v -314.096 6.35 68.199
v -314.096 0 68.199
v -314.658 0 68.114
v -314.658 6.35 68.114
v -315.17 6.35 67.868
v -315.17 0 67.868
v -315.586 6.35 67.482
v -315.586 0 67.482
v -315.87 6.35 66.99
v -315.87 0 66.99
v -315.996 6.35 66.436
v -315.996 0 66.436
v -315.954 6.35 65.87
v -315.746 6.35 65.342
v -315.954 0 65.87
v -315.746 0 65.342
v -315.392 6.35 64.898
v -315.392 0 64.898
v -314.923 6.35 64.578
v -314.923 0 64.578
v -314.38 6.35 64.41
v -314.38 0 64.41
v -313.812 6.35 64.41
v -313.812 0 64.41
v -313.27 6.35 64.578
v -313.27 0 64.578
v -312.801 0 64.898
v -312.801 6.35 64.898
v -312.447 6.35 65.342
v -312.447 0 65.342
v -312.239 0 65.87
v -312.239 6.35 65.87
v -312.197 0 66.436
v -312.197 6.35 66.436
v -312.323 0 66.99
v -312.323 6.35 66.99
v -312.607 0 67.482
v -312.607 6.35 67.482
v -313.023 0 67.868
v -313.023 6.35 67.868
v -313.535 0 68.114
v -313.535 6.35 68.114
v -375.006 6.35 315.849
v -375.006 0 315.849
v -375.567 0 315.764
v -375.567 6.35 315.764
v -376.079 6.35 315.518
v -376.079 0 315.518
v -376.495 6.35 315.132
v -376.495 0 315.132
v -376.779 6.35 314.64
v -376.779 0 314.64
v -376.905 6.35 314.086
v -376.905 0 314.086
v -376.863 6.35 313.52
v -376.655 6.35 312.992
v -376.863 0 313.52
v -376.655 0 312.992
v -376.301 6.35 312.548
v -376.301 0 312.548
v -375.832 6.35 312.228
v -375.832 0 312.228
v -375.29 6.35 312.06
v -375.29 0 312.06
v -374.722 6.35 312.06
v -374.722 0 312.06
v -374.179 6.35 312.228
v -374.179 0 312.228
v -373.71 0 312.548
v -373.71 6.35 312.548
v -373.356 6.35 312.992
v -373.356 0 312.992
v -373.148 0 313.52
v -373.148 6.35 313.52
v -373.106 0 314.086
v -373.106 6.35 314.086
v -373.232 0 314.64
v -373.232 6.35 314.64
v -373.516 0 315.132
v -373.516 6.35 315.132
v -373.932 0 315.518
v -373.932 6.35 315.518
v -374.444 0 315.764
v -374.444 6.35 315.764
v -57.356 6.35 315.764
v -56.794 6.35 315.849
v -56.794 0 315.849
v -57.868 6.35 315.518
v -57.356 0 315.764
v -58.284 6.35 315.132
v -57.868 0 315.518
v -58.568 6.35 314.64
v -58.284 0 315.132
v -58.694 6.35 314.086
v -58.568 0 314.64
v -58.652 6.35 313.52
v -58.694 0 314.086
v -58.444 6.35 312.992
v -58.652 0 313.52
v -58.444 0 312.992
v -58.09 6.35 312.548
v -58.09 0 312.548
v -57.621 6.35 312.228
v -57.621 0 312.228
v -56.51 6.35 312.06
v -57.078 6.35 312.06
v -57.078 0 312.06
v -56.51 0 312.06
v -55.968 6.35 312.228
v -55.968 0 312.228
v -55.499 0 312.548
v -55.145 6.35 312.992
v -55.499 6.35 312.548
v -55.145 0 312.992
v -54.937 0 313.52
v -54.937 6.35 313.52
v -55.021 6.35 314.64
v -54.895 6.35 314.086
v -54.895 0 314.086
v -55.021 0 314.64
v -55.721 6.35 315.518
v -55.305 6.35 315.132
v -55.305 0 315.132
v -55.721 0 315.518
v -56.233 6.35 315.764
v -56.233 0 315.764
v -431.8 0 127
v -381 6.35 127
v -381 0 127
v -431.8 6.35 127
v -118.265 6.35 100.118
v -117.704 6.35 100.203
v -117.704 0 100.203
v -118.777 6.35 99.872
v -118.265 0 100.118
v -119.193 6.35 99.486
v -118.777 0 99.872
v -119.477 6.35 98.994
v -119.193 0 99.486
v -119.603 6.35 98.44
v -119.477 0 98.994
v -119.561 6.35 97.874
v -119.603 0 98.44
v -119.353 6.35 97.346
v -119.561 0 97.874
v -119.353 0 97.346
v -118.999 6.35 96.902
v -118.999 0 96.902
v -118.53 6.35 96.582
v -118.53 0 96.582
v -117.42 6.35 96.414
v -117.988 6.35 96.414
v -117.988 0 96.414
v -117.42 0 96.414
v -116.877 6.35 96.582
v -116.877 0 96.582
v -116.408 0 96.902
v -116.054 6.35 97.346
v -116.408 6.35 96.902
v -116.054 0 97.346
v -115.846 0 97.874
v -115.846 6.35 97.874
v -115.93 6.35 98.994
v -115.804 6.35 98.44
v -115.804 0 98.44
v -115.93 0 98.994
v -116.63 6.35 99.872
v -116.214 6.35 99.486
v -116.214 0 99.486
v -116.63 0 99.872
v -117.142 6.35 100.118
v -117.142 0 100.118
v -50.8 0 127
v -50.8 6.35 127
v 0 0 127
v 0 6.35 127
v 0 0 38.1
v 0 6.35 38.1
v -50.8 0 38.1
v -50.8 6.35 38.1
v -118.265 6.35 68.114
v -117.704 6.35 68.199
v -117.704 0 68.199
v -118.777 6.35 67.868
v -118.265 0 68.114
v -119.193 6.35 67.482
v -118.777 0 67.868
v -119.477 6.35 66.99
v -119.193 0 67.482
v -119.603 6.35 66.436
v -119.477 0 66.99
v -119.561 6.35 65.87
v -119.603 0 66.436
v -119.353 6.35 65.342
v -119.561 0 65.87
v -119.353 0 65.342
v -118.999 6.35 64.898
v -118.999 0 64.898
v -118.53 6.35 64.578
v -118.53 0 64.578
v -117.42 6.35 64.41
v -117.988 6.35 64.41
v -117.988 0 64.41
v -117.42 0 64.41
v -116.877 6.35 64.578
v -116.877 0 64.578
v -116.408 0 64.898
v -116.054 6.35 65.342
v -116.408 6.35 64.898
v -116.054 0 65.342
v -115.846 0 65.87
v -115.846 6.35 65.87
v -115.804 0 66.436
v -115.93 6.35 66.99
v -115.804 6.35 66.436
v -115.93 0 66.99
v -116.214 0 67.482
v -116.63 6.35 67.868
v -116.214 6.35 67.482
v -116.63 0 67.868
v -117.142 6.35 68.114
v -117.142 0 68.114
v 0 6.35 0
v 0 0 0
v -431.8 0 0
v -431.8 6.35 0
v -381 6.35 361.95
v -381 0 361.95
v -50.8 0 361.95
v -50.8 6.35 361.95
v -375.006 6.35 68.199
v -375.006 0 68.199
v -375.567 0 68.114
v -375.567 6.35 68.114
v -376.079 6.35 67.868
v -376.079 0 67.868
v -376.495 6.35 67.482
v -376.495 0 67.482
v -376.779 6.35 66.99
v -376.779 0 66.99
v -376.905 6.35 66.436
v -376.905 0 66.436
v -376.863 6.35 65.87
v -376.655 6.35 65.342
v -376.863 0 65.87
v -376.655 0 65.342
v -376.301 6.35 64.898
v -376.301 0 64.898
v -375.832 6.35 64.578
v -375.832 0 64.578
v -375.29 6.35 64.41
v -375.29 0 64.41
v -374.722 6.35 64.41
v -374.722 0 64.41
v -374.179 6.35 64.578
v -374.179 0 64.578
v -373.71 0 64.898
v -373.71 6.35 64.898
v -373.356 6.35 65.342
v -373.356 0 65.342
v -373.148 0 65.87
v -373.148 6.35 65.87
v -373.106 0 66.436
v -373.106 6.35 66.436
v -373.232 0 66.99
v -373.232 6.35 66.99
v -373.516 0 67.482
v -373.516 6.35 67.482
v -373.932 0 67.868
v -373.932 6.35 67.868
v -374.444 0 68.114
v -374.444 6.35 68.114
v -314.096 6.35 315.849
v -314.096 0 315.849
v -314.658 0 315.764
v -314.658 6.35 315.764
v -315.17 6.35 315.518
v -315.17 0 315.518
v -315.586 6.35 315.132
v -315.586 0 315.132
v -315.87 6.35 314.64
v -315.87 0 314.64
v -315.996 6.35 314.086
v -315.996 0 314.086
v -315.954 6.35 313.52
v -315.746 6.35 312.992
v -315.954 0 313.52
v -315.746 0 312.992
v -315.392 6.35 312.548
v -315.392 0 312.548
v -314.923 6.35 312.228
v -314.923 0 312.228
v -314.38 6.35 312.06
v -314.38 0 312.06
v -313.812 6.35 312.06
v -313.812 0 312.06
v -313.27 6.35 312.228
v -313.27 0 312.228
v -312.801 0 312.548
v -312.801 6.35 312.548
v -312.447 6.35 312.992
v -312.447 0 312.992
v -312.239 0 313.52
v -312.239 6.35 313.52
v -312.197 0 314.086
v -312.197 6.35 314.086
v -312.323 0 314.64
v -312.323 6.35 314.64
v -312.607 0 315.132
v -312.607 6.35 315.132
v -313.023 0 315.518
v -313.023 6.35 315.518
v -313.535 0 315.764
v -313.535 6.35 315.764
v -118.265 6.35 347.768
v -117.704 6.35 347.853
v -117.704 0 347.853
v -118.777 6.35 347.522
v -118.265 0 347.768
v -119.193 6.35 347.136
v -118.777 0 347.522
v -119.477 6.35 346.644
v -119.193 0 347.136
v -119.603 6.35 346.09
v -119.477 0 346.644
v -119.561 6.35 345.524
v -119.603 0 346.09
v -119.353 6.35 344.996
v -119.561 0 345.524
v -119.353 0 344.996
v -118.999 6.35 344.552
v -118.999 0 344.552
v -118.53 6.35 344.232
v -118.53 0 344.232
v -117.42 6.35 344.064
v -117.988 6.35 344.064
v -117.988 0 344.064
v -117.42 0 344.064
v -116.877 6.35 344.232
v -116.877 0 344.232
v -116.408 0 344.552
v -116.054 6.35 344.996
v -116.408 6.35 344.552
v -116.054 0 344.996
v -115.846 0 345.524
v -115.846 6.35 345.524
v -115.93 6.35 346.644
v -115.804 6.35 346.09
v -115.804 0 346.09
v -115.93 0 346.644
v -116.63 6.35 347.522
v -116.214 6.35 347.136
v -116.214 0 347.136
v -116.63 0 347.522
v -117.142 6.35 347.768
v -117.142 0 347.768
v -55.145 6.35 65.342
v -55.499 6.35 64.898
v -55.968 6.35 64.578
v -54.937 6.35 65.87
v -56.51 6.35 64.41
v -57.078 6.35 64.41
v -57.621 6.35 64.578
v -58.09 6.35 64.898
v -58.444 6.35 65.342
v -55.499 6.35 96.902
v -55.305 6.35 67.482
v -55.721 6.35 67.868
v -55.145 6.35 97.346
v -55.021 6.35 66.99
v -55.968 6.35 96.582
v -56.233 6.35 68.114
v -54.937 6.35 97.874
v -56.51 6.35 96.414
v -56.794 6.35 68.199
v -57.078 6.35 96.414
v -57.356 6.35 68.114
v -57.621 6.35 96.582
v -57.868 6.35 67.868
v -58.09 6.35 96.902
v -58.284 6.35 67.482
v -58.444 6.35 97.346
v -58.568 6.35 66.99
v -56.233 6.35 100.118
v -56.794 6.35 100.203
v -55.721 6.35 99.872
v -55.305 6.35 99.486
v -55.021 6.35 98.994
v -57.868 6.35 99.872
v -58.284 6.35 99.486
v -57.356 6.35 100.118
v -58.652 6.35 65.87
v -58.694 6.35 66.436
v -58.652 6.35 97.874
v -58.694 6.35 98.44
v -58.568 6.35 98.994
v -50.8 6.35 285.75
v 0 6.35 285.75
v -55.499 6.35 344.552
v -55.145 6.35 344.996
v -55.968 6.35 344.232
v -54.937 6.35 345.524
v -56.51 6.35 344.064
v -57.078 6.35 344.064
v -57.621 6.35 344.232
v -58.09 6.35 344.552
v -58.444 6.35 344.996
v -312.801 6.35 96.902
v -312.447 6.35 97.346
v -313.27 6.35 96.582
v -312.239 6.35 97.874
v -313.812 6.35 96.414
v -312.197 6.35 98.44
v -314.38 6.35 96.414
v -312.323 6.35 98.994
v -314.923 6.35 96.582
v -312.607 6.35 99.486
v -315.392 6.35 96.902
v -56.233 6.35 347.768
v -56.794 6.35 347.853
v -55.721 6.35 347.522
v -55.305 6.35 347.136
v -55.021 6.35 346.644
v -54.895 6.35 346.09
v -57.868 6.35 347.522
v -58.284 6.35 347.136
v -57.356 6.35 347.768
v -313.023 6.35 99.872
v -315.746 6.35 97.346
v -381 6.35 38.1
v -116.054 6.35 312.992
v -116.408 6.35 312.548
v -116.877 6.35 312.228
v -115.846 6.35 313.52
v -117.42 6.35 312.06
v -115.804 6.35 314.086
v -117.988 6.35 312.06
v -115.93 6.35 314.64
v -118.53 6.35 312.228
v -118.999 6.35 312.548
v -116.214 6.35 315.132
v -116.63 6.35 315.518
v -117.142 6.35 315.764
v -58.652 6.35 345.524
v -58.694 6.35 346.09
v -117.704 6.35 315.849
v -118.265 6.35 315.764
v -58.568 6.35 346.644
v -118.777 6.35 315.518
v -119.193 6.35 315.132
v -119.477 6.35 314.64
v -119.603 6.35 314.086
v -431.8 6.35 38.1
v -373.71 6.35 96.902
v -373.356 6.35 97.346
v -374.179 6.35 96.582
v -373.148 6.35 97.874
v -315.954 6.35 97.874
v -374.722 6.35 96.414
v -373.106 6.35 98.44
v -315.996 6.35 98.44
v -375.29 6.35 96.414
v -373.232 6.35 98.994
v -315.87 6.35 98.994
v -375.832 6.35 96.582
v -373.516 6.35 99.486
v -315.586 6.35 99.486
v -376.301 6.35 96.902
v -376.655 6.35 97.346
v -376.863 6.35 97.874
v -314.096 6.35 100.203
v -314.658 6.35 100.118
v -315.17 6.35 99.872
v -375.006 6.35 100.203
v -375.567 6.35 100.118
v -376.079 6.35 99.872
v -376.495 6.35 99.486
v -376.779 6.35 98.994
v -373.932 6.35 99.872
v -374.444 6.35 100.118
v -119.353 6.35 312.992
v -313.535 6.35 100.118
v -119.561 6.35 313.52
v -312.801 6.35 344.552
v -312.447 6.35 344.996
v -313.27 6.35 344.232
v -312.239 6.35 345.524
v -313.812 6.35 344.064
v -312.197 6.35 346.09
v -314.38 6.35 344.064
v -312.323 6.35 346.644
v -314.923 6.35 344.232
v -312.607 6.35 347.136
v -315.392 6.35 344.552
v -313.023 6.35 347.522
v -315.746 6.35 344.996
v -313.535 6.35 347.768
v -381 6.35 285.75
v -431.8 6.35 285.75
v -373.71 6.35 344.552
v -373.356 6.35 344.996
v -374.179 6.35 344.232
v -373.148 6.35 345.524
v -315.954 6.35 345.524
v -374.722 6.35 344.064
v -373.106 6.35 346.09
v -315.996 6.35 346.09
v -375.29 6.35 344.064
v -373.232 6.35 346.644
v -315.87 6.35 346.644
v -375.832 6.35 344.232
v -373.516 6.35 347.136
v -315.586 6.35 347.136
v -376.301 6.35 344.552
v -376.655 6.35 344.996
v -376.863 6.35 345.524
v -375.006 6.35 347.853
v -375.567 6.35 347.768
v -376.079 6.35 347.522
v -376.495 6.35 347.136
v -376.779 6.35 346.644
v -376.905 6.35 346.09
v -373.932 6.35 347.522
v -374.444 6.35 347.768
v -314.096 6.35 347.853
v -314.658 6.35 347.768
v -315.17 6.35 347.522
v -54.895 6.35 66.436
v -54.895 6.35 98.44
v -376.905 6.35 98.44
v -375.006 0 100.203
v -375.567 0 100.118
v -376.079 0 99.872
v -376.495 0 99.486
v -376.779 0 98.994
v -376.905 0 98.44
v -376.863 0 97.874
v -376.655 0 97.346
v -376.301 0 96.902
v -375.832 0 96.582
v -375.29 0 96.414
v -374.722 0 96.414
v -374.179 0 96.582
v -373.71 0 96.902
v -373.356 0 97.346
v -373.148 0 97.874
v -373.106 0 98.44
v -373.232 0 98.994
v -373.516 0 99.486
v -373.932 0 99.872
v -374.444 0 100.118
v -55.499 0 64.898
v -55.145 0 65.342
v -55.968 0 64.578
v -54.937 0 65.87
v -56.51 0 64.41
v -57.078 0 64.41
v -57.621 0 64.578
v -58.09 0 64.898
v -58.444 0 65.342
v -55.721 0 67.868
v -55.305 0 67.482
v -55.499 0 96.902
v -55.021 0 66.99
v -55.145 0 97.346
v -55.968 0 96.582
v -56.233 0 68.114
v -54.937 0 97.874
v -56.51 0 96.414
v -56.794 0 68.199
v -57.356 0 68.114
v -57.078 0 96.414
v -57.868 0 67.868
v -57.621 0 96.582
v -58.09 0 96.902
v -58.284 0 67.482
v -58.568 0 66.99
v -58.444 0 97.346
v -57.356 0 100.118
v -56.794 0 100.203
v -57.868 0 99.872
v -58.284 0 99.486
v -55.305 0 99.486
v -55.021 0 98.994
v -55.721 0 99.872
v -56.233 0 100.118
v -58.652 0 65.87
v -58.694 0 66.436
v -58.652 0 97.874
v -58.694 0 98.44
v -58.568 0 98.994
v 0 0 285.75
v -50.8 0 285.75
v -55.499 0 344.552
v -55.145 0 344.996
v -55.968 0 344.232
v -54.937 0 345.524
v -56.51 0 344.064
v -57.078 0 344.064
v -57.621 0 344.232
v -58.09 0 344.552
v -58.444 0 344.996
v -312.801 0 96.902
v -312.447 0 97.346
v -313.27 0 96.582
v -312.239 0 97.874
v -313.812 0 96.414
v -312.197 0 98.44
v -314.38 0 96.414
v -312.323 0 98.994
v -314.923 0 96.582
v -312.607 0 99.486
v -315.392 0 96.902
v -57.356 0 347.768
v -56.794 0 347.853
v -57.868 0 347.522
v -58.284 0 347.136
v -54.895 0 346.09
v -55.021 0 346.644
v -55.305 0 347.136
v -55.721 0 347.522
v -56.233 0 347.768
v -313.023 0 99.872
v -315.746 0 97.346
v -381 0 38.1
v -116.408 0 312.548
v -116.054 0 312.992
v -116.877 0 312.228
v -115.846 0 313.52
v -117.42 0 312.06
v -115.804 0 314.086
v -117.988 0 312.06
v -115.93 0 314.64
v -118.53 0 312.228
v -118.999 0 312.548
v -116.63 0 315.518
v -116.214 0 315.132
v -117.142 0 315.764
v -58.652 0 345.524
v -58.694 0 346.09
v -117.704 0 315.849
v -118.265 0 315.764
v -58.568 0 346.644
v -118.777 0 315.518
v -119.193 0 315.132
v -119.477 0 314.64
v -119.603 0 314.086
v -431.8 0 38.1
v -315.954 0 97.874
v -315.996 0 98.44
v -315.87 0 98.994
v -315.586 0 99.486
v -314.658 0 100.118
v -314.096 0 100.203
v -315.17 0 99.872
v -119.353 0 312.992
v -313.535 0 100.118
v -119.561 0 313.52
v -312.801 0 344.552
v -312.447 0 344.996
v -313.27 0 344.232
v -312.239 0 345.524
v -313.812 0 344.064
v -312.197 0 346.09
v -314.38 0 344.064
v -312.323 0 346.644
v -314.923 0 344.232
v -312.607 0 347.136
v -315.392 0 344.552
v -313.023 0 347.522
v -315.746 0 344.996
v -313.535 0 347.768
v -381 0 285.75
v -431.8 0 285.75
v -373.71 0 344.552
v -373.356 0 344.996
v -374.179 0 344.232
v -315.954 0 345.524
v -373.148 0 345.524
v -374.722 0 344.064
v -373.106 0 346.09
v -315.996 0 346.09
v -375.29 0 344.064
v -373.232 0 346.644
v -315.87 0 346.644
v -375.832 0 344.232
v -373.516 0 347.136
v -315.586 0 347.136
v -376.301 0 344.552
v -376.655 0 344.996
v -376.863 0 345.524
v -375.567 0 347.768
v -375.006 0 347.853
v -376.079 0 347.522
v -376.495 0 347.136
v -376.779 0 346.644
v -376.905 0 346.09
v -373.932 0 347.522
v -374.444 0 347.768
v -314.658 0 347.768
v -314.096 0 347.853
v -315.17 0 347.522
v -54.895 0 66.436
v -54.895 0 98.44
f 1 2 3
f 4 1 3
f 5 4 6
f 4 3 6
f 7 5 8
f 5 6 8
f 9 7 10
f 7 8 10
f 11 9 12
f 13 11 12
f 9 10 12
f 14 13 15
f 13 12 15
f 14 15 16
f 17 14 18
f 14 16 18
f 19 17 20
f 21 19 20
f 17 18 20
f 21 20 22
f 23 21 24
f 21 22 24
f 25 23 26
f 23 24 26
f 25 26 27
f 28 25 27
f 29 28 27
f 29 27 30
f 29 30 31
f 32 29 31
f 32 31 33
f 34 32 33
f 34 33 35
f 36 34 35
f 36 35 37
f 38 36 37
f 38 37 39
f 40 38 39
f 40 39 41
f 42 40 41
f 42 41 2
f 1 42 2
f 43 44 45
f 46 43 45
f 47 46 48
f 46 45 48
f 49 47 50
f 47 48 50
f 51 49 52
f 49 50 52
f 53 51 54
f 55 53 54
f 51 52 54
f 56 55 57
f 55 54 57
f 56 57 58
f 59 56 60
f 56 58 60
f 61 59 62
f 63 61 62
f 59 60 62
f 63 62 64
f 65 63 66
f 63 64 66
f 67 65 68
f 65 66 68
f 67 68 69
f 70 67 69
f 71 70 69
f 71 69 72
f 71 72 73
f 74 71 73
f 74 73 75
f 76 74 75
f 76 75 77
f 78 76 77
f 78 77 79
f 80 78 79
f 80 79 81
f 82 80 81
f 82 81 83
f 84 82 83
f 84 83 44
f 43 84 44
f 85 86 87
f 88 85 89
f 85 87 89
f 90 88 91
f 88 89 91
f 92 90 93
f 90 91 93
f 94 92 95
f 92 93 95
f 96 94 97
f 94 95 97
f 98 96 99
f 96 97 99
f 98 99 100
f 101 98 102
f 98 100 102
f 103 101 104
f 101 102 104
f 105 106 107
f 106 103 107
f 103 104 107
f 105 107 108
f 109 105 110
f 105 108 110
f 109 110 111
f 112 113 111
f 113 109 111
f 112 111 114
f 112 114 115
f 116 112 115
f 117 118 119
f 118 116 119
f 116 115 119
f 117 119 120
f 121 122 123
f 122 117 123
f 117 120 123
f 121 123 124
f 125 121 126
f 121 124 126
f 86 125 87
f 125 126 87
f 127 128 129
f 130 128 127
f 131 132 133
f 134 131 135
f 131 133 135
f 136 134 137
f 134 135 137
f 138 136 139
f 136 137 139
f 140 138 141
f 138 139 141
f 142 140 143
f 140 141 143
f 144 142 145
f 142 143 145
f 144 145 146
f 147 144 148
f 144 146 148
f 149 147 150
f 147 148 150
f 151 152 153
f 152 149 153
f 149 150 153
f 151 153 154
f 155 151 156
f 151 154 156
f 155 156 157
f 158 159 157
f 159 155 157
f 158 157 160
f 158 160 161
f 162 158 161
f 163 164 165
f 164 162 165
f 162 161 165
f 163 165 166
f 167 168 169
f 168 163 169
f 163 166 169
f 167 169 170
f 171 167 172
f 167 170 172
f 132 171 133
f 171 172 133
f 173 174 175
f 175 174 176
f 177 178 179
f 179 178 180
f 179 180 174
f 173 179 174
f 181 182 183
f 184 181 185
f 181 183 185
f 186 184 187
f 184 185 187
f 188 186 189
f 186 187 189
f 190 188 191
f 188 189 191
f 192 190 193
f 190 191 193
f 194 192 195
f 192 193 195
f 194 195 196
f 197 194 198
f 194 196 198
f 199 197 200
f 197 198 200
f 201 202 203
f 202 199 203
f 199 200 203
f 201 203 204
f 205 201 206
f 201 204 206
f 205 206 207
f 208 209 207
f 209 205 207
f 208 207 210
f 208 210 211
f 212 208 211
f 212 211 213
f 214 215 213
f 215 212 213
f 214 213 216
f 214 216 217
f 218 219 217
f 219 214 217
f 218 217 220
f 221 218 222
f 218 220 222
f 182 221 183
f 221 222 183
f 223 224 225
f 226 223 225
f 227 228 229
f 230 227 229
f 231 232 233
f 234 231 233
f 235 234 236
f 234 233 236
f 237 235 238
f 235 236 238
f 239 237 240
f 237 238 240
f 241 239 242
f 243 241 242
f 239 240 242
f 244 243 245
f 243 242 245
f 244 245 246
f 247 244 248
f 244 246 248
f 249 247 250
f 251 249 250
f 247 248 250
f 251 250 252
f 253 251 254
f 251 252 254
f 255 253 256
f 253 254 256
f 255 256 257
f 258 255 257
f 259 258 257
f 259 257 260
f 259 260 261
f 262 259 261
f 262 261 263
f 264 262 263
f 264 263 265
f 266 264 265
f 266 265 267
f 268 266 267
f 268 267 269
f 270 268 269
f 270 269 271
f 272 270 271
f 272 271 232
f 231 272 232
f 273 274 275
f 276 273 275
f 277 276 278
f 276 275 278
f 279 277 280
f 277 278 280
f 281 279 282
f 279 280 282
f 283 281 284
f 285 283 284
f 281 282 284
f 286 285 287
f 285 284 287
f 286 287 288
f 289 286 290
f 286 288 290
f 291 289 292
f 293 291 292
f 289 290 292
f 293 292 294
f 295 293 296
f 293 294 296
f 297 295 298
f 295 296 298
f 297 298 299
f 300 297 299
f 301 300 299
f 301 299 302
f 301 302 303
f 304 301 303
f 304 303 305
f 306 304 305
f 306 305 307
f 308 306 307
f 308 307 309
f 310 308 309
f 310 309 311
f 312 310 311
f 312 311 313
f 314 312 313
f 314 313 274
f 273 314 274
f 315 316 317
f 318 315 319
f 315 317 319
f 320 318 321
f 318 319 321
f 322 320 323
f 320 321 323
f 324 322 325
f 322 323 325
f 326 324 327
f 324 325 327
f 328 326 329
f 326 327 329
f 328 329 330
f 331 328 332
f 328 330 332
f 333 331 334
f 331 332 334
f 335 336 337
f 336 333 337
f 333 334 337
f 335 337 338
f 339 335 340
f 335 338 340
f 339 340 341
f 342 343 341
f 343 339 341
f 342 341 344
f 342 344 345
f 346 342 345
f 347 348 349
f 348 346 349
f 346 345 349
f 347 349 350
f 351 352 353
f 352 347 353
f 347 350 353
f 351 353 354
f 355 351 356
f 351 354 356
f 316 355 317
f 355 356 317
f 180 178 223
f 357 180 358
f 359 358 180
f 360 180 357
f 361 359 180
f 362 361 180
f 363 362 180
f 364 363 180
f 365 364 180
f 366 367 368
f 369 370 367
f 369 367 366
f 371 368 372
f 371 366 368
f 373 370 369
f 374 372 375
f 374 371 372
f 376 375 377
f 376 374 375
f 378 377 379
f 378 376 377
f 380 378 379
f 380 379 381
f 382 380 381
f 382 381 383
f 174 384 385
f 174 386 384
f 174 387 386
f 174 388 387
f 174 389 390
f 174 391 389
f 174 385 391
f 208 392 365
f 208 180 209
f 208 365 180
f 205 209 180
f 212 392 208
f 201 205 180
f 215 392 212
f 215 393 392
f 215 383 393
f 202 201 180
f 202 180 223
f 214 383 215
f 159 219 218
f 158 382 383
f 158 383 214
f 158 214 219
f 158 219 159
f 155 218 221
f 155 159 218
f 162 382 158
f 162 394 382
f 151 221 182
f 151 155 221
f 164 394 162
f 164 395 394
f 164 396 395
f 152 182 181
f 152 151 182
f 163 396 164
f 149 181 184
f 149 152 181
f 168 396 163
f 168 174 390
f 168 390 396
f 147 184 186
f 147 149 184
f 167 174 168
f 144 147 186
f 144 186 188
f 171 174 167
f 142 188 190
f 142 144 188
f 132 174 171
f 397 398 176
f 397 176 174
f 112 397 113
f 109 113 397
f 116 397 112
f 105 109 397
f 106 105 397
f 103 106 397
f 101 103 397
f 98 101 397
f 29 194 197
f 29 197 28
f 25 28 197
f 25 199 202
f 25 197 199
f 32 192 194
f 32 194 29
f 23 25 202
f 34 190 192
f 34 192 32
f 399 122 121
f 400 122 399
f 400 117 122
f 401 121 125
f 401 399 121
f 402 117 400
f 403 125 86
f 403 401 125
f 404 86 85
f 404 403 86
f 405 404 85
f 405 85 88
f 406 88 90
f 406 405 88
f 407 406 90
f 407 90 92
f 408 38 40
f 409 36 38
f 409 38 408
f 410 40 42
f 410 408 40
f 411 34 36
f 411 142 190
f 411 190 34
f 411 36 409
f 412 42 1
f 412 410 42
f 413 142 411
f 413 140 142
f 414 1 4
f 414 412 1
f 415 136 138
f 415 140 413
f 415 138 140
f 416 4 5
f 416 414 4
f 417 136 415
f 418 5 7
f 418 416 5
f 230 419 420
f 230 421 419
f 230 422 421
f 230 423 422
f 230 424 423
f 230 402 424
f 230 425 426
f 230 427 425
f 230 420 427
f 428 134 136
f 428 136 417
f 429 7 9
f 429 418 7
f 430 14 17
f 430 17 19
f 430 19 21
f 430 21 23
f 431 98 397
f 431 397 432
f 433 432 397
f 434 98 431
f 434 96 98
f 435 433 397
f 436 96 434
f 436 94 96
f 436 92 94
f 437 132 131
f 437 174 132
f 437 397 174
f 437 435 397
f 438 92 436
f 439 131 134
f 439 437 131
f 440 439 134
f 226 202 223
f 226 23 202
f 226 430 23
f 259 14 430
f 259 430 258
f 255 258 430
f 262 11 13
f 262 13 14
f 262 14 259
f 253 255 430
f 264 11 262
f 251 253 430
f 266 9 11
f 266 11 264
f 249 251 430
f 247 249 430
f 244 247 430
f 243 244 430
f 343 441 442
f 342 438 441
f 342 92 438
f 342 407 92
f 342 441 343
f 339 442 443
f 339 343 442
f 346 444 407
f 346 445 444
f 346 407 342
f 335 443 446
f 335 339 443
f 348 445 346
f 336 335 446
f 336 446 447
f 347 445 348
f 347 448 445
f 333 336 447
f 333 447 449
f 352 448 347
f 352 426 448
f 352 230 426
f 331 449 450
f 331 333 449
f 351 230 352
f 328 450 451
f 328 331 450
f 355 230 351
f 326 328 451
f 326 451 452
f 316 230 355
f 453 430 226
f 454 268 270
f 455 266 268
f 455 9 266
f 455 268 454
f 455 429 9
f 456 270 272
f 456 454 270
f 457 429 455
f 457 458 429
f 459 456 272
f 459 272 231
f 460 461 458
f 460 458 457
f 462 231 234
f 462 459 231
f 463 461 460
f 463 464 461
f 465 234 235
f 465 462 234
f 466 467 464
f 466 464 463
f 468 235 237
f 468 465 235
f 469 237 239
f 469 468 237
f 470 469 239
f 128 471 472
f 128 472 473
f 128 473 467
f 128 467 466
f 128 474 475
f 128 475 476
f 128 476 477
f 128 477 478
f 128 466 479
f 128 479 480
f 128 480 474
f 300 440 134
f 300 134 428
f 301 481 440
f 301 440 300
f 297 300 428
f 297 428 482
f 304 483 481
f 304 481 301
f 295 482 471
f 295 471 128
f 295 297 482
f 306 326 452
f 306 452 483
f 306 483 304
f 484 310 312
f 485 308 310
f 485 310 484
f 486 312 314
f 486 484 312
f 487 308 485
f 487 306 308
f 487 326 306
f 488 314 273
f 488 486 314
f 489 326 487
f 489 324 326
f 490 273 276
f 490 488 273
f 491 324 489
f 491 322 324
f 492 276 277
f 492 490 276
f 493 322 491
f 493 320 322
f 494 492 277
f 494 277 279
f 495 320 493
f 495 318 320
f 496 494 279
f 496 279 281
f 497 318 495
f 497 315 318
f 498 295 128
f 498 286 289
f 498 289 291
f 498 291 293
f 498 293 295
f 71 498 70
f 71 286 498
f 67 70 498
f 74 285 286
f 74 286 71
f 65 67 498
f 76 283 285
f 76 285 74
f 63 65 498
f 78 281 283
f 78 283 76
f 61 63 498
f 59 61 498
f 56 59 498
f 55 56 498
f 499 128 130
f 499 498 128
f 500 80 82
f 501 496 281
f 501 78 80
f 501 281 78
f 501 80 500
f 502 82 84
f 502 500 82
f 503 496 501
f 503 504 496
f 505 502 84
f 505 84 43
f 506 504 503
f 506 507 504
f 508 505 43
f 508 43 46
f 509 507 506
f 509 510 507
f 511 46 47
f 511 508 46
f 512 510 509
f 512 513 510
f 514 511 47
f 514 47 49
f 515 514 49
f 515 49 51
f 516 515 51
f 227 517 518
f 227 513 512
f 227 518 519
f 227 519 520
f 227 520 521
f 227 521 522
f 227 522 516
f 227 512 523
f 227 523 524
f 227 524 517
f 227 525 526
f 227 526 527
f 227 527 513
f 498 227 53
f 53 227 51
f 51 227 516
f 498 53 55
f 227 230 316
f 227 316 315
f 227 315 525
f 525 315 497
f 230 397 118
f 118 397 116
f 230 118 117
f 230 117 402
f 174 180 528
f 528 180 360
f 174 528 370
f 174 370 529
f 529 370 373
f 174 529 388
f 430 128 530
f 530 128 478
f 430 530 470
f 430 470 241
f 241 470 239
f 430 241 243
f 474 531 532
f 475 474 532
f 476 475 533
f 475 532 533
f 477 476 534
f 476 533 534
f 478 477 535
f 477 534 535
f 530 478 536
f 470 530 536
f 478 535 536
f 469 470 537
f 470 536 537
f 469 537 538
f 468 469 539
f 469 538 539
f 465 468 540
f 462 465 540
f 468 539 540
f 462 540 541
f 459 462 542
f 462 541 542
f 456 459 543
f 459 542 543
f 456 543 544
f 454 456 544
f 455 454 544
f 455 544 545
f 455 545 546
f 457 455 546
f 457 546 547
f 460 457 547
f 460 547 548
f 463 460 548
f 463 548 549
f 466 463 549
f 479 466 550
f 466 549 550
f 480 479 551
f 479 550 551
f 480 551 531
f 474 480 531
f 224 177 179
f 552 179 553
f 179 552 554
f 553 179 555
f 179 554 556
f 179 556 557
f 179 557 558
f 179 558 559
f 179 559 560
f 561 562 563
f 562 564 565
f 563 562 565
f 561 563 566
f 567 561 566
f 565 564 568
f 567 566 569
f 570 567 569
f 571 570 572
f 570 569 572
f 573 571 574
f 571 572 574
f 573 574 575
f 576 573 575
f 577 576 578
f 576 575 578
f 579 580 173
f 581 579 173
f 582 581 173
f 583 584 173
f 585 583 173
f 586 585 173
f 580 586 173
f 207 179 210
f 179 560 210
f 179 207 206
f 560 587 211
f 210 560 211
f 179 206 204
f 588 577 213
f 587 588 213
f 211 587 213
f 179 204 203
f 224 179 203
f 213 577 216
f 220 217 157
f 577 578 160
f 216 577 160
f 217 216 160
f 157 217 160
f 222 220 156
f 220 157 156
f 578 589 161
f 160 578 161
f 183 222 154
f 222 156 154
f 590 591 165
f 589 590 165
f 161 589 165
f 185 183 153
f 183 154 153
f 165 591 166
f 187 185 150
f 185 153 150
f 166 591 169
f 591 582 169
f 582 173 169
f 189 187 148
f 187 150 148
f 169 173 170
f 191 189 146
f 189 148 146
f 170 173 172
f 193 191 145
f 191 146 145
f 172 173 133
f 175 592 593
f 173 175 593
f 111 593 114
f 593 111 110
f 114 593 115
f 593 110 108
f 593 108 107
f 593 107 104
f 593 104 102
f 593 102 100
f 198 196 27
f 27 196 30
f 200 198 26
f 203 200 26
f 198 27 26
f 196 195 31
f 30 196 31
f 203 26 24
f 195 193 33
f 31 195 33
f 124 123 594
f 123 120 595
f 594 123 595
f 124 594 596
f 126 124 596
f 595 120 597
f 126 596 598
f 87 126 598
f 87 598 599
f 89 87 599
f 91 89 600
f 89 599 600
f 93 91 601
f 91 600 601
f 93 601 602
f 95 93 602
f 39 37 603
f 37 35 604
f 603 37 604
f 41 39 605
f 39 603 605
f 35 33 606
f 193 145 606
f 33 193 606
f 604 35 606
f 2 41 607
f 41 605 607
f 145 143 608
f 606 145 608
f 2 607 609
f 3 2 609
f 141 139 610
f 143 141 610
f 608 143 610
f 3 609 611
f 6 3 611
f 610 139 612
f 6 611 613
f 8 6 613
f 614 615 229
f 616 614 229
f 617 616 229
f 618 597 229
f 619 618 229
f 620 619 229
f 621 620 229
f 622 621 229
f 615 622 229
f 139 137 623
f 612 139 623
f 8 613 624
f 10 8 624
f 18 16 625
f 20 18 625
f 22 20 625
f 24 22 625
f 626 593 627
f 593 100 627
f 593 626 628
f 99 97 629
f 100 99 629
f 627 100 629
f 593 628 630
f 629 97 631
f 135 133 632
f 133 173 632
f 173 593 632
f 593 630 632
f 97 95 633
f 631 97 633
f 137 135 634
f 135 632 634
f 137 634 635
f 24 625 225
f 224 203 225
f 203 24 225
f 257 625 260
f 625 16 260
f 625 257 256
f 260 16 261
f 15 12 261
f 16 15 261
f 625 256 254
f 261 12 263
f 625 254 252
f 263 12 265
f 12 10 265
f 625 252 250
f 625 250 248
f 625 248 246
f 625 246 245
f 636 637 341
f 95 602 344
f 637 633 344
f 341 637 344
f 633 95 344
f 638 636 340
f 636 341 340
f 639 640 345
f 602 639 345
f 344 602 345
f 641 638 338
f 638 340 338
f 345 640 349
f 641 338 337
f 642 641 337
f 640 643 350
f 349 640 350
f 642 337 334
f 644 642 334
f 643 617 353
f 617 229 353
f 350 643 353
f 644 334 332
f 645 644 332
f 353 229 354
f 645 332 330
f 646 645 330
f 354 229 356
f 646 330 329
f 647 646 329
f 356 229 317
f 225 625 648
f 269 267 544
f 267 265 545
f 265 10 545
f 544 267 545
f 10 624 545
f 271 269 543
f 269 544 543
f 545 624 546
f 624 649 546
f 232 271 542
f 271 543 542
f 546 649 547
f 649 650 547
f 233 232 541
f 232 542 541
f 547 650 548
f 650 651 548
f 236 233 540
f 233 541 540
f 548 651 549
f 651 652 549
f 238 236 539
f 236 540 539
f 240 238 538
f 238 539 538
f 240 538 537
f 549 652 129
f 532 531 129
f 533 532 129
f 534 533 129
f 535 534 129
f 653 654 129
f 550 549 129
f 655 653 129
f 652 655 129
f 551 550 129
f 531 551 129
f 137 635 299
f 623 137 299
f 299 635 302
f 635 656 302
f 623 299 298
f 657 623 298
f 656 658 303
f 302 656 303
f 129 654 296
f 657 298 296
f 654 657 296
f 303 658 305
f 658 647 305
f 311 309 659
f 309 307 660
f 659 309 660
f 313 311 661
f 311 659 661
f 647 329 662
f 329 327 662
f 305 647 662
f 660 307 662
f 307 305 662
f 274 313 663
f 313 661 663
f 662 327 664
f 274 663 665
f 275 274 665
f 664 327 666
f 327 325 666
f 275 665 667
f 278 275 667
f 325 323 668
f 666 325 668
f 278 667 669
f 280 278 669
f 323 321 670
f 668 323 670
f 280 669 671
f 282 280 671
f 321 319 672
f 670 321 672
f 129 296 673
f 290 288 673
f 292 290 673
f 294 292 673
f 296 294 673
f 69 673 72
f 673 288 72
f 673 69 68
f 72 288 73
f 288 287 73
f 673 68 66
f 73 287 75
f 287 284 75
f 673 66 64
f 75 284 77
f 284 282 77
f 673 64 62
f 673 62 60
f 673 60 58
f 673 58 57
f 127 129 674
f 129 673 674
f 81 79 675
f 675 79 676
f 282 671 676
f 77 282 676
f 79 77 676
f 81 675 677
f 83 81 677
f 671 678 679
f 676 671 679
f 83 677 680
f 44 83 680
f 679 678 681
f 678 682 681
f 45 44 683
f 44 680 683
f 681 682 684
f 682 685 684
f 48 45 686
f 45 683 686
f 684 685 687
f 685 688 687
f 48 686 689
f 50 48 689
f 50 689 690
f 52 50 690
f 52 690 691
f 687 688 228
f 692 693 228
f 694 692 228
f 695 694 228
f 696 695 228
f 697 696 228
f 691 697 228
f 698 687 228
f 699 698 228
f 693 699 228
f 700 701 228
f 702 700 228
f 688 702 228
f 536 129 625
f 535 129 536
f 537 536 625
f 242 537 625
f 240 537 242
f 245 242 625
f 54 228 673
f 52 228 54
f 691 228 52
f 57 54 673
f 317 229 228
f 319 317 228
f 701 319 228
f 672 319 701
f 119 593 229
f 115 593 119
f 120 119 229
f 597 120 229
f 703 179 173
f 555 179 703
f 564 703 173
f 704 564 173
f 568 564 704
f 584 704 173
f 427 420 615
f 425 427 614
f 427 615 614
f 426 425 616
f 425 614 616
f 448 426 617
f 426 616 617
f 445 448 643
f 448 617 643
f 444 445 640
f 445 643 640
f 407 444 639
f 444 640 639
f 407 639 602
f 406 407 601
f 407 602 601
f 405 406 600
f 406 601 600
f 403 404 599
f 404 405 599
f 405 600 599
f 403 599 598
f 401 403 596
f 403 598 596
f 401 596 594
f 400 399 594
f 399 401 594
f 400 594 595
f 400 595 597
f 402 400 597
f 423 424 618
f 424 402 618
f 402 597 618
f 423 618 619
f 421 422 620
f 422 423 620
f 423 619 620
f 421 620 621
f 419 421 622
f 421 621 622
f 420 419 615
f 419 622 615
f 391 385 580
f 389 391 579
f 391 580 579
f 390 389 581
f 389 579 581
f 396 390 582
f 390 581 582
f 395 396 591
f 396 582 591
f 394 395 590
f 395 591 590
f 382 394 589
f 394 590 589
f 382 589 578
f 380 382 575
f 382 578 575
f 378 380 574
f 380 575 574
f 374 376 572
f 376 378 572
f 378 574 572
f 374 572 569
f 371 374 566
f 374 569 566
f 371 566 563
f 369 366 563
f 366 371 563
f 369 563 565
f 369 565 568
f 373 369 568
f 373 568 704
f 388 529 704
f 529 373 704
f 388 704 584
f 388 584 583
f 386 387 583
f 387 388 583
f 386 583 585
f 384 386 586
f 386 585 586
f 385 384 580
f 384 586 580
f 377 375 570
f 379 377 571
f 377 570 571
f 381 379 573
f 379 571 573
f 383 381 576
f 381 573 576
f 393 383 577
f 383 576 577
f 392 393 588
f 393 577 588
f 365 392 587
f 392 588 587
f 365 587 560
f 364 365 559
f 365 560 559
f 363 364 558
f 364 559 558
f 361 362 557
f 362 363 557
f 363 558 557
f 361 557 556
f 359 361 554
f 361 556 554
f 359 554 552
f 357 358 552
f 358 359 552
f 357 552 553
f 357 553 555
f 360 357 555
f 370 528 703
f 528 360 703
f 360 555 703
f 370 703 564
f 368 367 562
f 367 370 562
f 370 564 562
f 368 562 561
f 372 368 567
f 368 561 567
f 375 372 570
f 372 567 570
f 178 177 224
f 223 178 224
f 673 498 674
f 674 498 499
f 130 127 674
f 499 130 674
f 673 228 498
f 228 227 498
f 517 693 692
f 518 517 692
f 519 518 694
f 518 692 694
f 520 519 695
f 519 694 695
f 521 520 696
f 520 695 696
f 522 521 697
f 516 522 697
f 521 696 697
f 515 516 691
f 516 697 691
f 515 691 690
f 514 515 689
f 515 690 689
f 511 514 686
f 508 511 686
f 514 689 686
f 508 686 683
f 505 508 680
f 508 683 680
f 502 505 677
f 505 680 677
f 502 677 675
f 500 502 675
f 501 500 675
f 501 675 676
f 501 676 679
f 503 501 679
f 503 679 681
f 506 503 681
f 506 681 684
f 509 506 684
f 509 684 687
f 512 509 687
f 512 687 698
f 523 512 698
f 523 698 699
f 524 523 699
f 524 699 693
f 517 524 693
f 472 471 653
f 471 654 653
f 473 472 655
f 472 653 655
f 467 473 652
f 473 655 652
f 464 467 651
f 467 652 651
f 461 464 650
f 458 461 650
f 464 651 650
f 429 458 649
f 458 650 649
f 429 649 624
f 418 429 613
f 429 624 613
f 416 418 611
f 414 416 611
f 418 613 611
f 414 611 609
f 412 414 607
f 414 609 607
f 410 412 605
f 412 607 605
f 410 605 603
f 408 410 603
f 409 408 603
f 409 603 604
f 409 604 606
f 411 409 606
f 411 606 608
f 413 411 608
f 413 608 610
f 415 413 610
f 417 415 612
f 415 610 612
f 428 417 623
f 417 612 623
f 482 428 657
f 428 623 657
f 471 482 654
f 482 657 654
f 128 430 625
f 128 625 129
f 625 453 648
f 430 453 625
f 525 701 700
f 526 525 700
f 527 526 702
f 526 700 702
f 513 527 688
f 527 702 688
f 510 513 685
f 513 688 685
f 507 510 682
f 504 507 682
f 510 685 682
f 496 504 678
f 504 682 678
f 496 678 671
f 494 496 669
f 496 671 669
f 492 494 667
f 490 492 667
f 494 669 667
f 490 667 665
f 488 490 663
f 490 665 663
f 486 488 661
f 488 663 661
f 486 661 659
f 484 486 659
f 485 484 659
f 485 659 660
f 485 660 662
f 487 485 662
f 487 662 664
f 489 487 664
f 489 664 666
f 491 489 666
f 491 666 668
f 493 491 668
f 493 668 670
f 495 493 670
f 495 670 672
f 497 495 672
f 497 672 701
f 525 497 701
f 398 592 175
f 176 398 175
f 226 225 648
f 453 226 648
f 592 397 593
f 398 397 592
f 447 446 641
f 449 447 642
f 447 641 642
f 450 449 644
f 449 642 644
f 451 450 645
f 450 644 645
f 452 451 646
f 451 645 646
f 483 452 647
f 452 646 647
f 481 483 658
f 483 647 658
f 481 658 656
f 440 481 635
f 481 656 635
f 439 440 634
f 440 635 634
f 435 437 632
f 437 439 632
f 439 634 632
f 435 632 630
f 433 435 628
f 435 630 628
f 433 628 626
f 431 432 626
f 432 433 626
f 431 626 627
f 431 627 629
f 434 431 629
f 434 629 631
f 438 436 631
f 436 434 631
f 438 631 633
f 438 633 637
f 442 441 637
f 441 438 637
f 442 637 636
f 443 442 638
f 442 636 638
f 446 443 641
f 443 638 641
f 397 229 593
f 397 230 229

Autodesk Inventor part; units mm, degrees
ref_plane "YZ Plane" through (0, 0, 0) normal (1, 0, 0) x (0, 1, 0)
ref_plane "XZ Plane" through (0, 0, 0) normal (0, 1, 0) x (-1, 0, 0)
sketch "Sketch1" plane through (0, 0, 0) normal (0, 1, 0) x (-1, 0, 0)
  line L0 (0, 0) -> (431.8, 0)
  line L1 (431.8, 0) -> (431.8, 361.95)
  line L2 (431.8, 361.95) -> (0, 361.95)
  line L3 (0, 361.95) -> (0, 0)
  dimension "d0" = 431.8
  dimension "d1" = 361.95
extrude "Extrusion1" add sketch "Sketch1" along normal blind 6.35
sketch "Sketch3" plane through (0, 6.35, 0) normal (0, 1, 0) x (1, 0, 0)
  line L0 (-431.8, 0) -> (-431.8, -361.95) projected
  line L1 (-431.8, -361.95) -> (-381, -361.95)
  line L2 (-381, -361.95) -> (-381, -285.75)
  line L3 (-381, -285.75) -> (-431.8, -285.75)
  line L4 (-431.8, -285.75) -> (-431.8, -361.95)
  line L5 (-431.8, -38.1) -> (-381, -38.1)
  line L6 (-381, -38.1) -> (-381, -127)
  line L7 (-381, -127) -> (-431.8, -127)
  line L8 (-431.8, -127) -> (-431.8, -38.1)
  line L9 (0, -361.95) -> (0, 0) projected
  line L10 (0, -38.1) -> (-50.8, -38.1)
  line L11 (-50.8, -38.1) -> (-50.8, -127)
  line L12 (-50.8, -127) -> (0, -127)
  line L13 (0, -127) -> (0, -38.1)
  line L14 (0, -361.95) -> (-50.8, -361.95)
  line L15 (-50.8, -361.95) -> (-50.8, -285.75)
  line L16 (-50.8, -285.75) -> (0, -285.75)
  line L17 (0, -285.75) -> (0, -361.95)
  line L18 (0, 0) -> (-431.8, 0) projected
  dimension "d11" = 76.2
  dimension "d12" = 88.9
  dimension "d13" = 127
  dimension "d14" = 50.8
  dimension "d15" = 50.8
extrude "Extrusion3" cut sketch "Sketch3" against normal blind 6.35
sketch "Sketch4" plane through (0, 6.35, 0) normal (0, 1, 0) x (1, 0, 0)
  line L0 (0, 0) -> (-431.8, 0) projected
  line L1 (-381, -38.1) -> (-381, -127) projected
  line L2 (-381, -285.75) -> (-381, -361.95) projected
  line L3 (-381, -361.95) -> (-50.8, -361.95) projected
  point P0 (-375.0056, -66.294)
  point P1 (-375.0056, -98.298)
  point P2 (-314.0964, -66.294)
  point P3 (-314.0964, -98.298)
  point P4 (-375.0056, -345.948)
  point P5 (-375.0056, -313.944)
  point P6 (-314.0964, -345.948)
  point P7 (-314.0964, -313.944)
  dimension "d18" = 66.294
  dimension "d19" = 5.9944
  dimension "d20" = 98.298
  dimension "d21" = 5.9944
  dimension "d22" = 66.9036
  dimension "d23" = 66.294
  dimension "d24" = 98.298
  dimension "d25" = 66.9036
  dimension "d26" = 5.9944
  dimension "d27" = 16.002
  dimension "d28" = 5.9944
  dimension "d29" = 48.006
  dimension "d30" = 66.9036
  dimension "d31" = 66.9036
  dimension "d32" = 16.002
  dimension "d33" = 48.006
hole "Hole1" at (-375.0056, 6.35, 66.294) at (-375.0056, 6.35, 98.298) at (-314.0964, 6.35, 66.294) at (-314.0964, 6.35, 98.298) at (-375.0056, 6.35, 345.948) at (-375.0056, 6.35, 313.944) at (-314.0964, 6.35, 345.948) at (-314.0964, 6.35, 313.944) direction (0, -1, 0) diameter 3.81 end through all
ref_plane "Work Plane1" through (-215.9, 0, 285.75) normal (1, 0, 0) x (0, 0, -1)
mirror "Mirror1" about plane through (-215.9, 0, 285.75) normal (1, 0, 0) of "Hole1"
equation "\"d18\" = d23"
equation "\"d19\" = d21"
equation "\"d22\" = d25"
equation "\"d24\" = d20"
equation "\"d26\" = d21"
equation "\"d27\" = d32"
equation "\"d28\" = d21"
equation "\"d30\" = d25"
equation "\"d31\" = d25"
equation "\"d33\" = d29"
properties part number "Gen 2.0 rev mecanums base plate"
